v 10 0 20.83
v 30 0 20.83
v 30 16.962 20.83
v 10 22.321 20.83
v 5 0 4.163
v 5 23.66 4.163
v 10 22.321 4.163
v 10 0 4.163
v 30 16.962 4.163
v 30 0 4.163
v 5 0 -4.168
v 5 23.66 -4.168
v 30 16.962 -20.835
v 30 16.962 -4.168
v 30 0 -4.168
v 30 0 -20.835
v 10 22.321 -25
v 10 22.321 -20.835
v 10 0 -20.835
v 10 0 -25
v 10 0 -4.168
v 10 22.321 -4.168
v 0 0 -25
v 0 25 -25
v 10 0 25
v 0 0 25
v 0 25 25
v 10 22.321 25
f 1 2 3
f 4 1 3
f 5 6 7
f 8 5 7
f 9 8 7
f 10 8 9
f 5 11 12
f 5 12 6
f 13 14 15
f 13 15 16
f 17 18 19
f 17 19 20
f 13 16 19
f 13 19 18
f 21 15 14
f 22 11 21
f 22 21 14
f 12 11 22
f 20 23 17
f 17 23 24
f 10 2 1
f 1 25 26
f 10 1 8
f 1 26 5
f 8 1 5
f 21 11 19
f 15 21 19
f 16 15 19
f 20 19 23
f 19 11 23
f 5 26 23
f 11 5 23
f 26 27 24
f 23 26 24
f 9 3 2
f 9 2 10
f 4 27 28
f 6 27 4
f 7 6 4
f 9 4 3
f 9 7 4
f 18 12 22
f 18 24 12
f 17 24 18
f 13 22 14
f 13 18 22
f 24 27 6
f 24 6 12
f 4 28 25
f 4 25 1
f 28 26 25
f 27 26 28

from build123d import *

# Parameters (mm, degrees)
CROQUIS1_W                 = 50
CROQUIS1_H                 = 25
SALIENTE_EXTRUIR1_DEPTH    = 10
CROQUIS2_W                 = 16.666666667
CROQUIS2_H                 = 25
SALIENTE_EXTRUIR2_DEPTH    = 20
CORTAR_EXTRUIR1_DEPTH      = 64.442887702
CORTAR_EXTRUIR1_DEPTH_BACK = 64.442887702
CROQUIS5_W                 = 5
CROQUIS5_H                 = 8.331666666
CORTAR_EXTRUIR3_DEPTH      = 47.368092477


with BuildPart() as part:
    # Croquis1 → Saliente-Extruir1 (new body)
    with BuildSketch(Plane(origin=(0, 0, 0), x_dir=(0, 0, -1), z_dir=(1, 0, 0))):
        with Locations((0, 12.5)):
            Rectangle(CROQUIS1_W, CROQUIS1_H)
    extrude(amount=SALIENTE_EXTRUIR1_DEPTH)

    # Croquis2 → Saliente-Extruir2 (add)
    with BuildSketch(Plane(origin=(10, 0, 0), x_dir=(0, 0, -1), z_dir=(1, 0, 0))):
        with Locations((-12.496666667, 12.5)):
            Rectangle(CROQUIS2_W, CROQUIS2_H)
        with Locations((12.501666667, 12.5)):
            Rectangle(CROQUIS2_W, CROQUIS2_H)
    extrude(amount=SALIENTE_EXTRUIR2_DEPTH)

    # Croquis3 → Cortar-Extruir1 (cut, two sides: drawn at the far end of the back side and taken through both)
    with BuildSketch(Plane.XY.offset(25).offset(-CORTAR_EXTRUIR1_DEPTH_BACK)):
        Polygon((-85.10047698, 47.802604082), (0, 25), (30, 16.961524227), (115.10047698, -5.841079855), (160.705685145, 164.359874105), (-39.495268815, 218.003558043), align=None)
    extrude(amount=CORTAR_EXTRUIR1_DEPTH + CORTAR_EXTRUIR1_DEPTH_BACK, mode=Mode.SUBTRACT)

    # Croquis5 → Cortar-Extruir3 (cut, through all)
    with BuildSketch(Plane.XZ):
        with Locations((7.5, -0.0025)):
            Rectangle(CROQUIS5_W, CROQUIS5_H)
    extrude(amount=-CORTAR_EXTRUIR3_DEPTH, mode=Mode.SUBTRACT)


solid = part.part
